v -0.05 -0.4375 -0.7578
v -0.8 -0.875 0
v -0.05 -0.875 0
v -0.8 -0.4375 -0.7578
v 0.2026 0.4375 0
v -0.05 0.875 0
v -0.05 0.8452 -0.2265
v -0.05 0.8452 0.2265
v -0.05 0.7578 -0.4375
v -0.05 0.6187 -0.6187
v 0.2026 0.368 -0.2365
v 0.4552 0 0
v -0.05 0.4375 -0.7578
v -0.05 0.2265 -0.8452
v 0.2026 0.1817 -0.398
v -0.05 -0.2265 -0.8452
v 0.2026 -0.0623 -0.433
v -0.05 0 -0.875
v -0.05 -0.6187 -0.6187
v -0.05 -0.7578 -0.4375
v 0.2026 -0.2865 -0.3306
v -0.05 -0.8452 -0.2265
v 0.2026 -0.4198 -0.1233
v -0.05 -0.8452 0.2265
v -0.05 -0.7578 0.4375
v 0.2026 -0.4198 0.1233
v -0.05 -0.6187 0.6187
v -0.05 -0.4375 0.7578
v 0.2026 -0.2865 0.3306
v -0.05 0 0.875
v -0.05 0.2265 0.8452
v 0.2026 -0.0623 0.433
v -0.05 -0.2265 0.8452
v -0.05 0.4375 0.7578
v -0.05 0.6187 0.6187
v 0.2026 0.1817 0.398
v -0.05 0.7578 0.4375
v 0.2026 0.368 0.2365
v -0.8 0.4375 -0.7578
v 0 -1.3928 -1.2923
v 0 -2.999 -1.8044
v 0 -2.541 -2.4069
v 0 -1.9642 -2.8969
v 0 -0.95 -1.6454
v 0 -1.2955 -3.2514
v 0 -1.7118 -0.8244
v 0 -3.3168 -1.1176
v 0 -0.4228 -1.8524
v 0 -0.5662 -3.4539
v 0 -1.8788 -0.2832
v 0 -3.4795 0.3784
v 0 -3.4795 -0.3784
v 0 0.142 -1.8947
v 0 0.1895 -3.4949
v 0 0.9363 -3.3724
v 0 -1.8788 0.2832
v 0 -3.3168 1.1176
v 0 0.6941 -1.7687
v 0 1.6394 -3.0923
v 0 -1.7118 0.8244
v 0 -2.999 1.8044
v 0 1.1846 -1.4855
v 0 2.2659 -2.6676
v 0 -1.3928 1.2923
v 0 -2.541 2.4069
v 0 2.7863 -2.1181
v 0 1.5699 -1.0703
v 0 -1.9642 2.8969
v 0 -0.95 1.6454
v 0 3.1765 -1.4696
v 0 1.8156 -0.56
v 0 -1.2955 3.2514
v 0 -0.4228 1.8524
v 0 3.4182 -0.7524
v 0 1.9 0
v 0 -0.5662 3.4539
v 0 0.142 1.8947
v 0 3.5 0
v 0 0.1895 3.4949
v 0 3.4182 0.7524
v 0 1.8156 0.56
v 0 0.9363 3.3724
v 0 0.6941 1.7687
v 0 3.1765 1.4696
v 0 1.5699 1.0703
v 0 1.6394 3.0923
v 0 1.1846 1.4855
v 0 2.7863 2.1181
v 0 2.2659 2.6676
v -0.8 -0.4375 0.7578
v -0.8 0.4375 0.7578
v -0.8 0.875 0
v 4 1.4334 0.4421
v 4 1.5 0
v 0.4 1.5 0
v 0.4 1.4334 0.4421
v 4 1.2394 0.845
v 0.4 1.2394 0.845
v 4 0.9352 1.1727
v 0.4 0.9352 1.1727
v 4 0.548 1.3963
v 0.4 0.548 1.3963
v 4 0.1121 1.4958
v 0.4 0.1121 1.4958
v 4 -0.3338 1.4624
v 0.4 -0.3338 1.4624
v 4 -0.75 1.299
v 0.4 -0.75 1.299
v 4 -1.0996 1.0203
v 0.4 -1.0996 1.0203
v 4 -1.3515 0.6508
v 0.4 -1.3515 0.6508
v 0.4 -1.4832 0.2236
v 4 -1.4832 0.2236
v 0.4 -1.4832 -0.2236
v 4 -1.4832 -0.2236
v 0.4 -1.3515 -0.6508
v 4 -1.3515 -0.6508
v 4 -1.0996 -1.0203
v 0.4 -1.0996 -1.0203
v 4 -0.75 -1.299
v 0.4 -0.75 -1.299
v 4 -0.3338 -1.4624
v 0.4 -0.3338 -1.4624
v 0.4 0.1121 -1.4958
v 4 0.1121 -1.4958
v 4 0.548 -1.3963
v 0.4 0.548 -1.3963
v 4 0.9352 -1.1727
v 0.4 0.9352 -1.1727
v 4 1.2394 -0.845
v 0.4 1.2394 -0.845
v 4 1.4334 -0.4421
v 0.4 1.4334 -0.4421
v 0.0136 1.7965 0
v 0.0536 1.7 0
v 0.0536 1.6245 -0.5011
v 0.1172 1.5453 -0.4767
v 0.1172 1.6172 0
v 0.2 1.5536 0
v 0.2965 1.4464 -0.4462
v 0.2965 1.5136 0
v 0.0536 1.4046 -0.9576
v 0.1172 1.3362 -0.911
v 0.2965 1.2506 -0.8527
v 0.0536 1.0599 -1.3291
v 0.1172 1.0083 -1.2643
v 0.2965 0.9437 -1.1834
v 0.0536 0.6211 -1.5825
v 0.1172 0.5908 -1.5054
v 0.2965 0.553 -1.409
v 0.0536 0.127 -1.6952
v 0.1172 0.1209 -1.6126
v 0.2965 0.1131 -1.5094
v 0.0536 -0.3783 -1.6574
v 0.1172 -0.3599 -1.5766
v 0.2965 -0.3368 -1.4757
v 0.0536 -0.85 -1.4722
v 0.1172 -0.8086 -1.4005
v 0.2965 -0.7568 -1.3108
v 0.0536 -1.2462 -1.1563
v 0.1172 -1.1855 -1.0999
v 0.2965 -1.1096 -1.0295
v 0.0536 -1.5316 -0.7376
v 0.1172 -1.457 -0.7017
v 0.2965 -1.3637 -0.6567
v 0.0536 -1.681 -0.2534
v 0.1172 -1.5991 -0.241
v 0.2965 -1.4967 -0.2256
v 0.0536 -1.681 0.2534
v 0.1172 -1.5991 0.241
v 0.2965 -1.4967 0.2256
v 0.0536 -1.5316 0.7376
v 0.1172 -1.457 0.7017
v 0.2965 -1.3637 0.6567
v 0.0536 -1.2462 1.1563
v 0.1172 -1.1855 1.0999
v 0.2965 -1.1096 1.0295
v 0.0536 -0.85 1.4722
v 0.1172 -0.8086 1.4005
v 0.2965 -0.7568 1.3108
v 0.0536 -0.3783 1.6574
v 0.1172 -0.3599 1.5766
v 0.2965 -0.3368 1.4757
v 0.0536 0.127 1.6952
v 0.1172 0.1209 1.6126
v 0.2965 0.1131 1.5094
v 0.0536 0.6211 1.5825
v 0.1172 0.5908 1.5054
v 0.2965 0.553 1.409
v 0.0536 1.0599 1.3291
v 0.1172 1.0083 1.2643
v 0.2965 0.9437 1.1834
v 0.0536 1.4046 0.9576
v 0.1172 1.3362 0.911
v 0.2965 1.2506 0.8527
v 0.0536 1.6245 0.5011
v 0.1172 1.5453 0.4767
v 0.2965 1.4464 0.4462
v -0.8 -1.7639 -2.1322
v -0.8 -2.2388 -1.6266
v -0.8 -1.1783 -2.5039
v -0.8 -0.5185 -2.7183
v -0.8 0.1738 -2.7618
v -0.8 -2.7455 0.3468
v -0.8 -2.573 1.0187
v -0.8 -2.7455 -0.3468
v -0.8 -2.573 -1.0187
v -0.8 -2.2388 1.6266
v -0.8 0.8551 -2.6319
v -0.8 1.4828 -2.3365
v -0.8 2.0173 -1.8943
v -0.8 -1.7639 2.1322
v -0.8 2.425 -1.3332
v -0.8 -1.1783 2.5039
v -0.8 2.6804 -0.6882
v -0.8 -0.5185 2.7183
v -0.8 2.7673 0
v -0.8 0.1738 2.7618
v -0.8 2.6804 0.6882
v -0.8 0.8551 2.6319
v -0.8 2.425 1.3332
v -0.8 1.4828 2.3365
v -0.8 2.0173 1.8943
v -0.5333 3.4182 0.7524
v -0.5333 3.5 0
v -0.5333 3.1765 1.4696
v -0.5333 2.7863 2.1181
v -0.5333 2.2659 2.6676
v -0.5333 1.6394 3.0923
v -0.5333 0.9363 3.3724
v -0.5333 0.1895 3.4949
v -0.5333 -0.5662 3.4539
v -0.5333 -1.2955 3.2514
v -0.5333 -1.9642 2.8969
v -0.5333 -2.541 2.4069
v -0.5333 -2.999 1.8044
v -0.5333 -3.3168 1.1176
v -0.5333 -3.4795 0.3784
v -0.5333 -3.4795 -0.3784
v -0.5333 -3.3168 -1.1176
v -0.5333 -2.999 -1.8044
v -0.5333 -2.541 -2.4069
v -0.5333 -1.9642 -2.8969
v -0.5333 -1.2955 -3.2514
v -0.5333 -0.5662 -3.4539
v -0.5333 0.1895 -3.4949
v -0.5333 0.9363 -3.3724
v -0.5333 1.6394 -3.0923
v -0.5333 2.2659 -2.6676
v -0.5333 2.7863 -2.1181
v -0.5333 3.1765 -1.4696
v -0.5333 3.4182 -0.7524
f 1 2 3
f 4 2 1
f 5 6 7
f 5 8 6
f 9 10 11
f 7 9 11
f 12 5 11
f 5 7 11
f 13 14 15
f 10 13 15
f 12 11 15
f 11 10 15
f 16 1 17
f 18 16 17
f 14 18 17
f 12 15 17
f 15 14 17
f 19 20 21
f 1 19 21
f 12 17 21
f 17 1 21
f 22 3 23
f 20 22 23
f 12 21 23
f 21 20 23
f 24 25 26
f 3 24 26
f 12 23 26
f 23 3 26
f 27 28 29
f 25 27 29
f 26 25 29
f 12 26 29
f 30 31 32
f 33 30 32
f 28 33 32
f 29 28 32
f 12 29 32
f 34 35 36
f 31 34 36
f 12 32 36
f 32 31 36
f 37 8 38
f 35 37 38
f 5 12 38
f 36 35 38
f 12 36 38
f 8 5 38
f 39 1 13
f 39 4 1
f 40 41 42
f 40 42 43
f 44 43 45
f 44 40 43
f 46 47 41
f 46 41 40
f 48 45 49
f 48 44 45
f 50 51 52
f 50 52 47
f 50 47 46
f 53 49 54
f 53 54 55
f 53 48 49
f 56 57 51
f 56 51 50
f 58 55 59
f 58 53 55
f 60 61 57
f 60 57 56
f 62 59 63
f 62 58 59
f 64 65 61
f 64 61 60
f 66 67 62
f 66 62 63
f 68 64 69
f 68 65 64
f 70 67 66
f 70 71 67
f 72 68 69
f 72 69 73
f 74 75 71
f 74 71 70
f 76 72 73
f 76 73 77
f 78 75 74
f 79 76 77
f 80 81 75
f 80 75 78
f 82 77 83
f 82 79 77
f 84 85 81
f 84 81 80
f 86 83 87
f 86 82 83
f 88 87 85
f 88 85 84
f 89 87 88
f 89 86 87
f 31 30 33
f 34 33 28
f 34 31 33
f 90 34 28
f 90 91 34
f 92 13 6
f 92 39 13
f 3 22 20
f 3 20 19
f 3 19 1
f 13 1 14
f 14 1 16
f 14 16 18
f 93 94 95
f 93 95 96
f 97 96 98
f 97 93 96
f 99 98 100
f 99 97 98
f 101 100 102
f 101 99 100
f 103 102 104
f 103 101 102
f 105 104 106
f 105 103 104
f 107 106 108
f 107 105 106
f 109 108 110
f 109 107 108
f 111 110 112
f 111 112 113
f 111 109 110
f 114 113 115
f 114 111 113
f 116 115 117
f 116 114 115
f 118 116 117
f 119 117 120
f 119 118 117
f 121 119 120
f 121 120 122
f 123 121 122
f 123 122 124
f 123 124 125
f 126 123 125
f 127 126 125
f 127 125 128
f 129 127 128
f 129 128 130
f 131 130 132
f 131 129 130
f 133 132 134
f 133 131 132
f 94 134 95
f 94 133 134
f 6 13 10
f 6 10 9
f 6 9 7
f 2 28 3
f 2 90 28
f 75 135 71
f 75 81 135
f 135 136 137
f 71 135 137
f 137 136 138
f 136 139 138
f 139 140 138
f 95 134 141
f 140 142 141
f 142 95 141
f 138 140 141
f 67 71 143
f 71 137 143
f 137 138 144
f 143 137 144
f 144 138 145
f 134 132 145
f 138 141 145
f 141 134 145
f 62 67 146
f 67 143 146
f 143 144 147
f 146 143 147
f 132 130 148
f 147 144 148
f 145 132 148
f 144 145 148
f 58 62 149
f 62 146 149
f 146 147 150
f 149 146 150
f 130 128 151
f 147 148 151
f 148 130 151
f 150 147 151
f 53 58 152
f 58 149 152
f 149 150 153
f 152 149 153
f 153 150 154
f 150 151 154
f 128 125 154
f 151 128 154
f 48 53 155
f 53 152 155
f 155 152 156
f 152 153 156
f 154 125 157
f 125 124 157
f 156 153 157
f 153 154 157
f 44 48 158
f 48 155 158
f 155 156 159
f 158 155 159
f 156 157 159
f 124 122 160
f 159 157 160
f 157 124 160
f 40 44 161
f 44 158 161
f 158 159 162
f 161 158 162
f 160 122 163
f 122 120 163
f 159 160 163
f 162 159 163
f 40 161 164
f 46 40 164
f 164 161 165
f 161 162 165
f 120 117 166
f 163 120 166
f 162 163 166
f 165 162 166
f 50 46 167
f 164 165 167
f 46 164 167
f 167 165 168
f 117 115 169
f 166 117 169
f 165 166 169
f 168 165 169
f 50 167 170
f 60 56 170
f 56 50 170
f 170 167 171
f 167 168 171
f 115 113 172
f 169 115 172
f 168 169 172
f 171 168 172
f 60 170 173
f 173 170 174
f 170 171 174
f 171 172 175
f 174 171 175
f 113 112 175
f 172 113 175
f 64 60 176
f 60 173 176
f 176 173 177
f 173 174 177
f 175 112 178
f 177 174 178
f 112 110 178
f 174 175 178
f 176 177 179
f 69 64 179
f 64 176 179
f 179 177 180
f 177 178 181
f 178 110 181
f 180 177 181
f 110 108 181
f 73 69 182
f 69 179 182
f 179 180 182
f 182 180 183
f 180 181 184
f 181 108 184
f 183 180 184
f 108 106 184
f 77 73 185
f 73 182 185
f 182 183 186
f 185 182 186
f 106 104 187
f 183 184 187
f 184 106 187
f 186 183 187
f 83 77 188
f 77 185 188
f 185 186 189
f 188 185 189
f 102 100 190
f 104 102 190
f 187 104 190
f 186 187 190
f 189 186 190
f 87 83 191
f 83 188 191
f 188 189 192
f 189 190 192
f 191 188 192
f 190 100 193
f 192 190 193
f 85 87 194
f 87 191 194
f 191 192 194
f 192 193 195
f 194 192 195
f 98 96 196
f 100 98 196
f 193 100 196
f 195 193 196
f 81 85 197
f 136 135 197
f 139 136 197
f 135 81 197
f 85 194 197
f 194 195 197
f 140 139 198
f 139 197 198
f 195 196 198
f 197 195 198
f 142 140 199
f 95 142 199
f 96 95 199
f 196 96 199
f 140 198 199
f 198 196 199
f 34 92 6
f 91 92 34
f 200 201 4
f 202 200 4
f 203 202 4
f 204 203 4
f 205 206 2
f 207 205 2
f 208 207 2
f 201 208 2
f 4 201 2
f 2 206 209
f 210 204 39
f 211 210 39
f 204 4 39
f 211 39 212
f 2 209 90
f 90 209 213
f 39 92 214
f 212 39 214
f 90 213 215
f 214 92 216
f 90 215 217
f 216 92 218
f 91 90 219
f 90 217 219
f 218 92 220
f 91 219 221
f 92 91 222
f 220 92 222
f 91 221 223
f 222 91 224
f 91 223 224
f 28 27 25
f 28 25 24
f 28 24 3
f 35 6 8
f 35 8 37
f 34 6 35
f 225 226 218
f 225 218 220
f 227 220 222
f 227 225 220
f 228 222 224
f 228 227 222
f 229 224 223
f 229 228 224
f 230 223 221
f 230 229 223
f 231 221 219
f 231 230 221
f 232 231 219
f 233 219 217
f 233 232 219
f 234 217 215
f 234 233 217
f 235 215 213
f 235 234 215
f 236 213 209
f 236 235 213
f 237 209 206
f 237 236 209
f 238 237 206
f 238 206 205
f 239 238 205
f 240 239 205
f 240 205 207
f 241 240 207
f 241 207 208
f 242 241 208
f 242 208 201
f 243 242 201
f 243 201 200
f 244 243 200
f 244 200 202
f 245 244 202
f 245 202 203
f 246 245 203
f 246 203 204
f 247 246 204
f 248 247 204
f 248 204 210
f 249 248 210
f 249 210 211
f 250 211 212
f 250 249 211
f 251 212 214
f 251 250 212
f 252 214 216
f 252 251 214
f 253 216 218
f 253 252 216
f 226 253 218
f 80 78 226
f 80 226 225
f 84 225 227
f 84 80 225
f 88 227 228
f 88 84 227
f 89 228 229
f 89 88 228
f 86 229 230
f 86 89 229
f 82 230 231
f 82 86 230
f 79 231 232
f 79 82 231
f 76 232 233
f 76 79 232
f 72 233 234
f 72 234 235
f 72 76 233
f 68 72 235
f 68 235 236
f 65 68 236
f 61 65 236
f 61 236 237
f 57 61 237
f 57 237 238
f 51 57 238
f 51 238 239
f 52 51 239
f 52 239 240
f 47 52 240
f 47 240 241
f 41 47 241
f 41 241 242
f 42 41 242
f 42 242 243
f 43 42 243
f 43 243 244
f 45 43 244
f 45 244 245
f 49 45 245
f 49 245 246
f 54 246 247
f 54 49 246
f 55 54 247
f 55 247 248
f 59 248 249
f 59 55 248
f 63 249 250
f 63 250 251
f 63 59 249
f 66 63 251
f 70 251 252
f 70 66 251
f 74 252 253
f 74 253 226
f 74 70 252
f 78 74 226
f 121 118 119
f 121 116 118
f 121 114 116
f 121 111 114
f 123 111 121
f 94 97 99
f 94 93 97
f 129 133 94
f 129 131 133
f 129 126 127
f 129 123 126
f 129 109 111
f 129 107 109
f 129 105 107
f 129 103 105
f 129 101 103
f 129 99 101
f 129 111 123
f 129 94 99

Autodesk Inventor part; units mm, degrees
ref_plane "YZ Plane" through (0, 0, 0) normal (1, 0, 0) x (0, 1, 0)
ref_plane "XZ Plane" through (0, 0, 0) normal (0, 1, 0) x (-1, 0, 0)
ref_plane "XY Plane" through (0, 0, 0) normal (0, 0, 1) x (1, 0, 0)
sketch "Sketch_1" plane through (0, 0, 0) normal (0, 0, 1) x (1, 0, 0)
  line L0 (6, 0) -> (0, 0)
  line L1 (-0.8, 0) -> (-0.8, 2.7673)
  line L2 (-0.8, 2.7673) -> (-0.5333, 3.5)
  line L3 (-0.5333, 3.5) -> (0, 3.5)
  line L4 (0, 3.5) -> (0, 1.9)
  arc A0 (0, 1.9) -> (0.4, 1.5) centre (0.4, 1.9) ccw
  line L5 (0.4, 1.5) -> (6, 1.5)
  line L6 (6, 1.5) -> (6, 0)
  line L7 (6, 0) -> (-0.8, 0)
  line L8 (0, 0) -> (-0.8, 0)
  dimension "d6" = 6
revolve "Revolution1" add sketch "Sketch_1" angle 360 about axis through (6, 0, 0) along (1, 0, 0)
thread "Thread1" size "M3x0.5" class "6g" standard "ISO Metric profile" length 5.5 offset 0.1
sketch "Sketch_5" plane through (-0.05, 0, 0) normal (1, 0, 0) x (0, 0, -1)
  arc A0 (-0.6801, -0.1159) -> (-0.4404, -0.531) centre (-0.5499, -0.3175) ccw
  arc A1 (-0.341, -0.5357) -> (-0.4404, -0.531) centre (-0.3947, -0.62) ccw
  arc A2 (-0.341, -0.5357) -> (-0.2934, -0.5632) centre (0, 0) ccw
  arc A3 (-0.2397, -0.6469) -> (-0.2934, -0.5632) centre (-0.3396, -0.6519) ccw
  arc A4 (-0.2397, -0.6469) -> (0.2397, -0.6469) centre (0, -0.635) ccw
  arc A5 (0.2934, -0.5632) -> (0.2397, -0.6469) centre (0.3396, -0.6519) ccw
  arc A6 (0.2934, -0.5632) -> (0.341, -0.5357) centre (0, 0) ccw
  arc A7 (0.4404, -0.531) -> (0.341, -0.5357) centre (0.3947, -0.62) ccw
  arc A8 (0.4404, -0.531) -> (0.6801, -0.1159) centre (0.5499, -0.3175) ccw
  arc A9 (0.6344, -0.0275) -> (0.6801, -0.1159) centre (0.7343, -0.0318) ccw
  arc A10 (0.6344, -0.0275) -> (0.6344, 0.0275) centre (0, 0) ccw
  arc A11 (0.6801, 0.1159) -> (0.6344, 0.0275) centre (0.7343, 0.0318) ccw
  arc A12 (0.6801, 0.1159) -> (0.4404, 0.531) centre (0.5499, 0.3175) ccw
  arc A13 (0.341, 0.5357) -> (0.4404, 0.531) centre (0.3947, 0.62) ccw
  arc A14 (0.341, 0.5357) -> (0.2934, 0.5632) centre (0, 0) ccw
  arc A15 (0.2397, 0.6469) -> (0.2934, 0.5632) centre (0.3396, 0.6519) ccw
  arc A16 (0.2397, 0.6469) -> (-0.2397, 0.6469) centre (0, 0.635) ccw
  arc A17 (-0.2934, 0.5632) -> (-0.2397, 0.6469) centre (-0.3396, 0.6519) ccw
  arc A18 (-0.2934, 0.5632) -> (-0.341, 0.5357) centre (0, 0) ccw
  arc A19 (-0.4404, 0.531) -> (-0.341, 0.5357) centre (-0.3947, 0.62) ccw
  arc A20 (-0.4404, 0.531) -> (-0.6801, 0.1159) centre (-0.5499, 0.3175) ccw
  arc A21 (-0.6344, 0.0275) -> (-0.6801, 0.1159) centre (-0.7343, 0.0318) ccw
  arc A22 (-0.6344, 0.0275) -> (-0.6344, -0.0275) centre (0, 0) ccw
  arc A23 (-0.6801, -0.1159) -> (-0.6344, -0.0275) centre (-0.7343, -0.0318) ccw
extrude "Extrusion1" cut sketch "Sketch_5" against normal blind 0.75
sketch "Sketch_2" plane through (0, 0, 0) normal (0, 0, 1) x (1, 0, 0)
  line L0 (0.4552, 0) -> (0, 0)
  line L1 (-0.05, 0) -> (-0.05, 0.875)
  line L2 (-0.05, 0.875) -> (0.4552, 0)
  line L3 (0.4552, 0) -> (-0.05, 0)
revolve "Revolution2" cut sketch "Sketch_2" angle 360 about axis through (0.4552, 0, 0) along (1, 0, 0)
sketch "スケッチ4" plane through (6, 0, 0) normal (1, 0, 0) x (0, 0, -1)
  circle A0 centre (0, 0) radius 1.5 projected
extrude "押し出し2" cut sketch "スケッチ4" against normal blind 2
sketch "スケッチ5" plane through (-0.8, 0, 0) normal (-1, 0, 0) x (0, 0, 1)
  arc A0 (0.4404, -0.531) -> (0.341, -0.5357) centre (0.3947, -0.62) ccw projected
  arc A1 (0.2934, -0.5632) -> (0.341, -0.5357) centre (0, 0) ccw projected
  arc A2 (0.2934, -0.5632) -> (0.2397, -0.6469) centre (0.3396, -0.6519) ccw projected
  arc A3 (-0.2397, -0.6469) -> (0.2397, -0.6469) centre (0, -0.635) ccw projected
  arc A4 (-0.2397, -0.6469) -> (-0.2934, -0.5632) centre (-0.3396, -0.6519) ccw projected
  arc A5 (-0.341, -0.5357) -> (-0.2934, -0.5632) centre (0, 0) ccw projected
  arc A6 (-0.341, -0.5357) -> (-0.4404, -0.531) centre (-0.3947, -0.62) ccw projected
  arc A7 (-0.6801, -0.1159) -> (-0.4404, -0.531) centre (-0.5499, -0.3175) ccw projected
  arc A8 (-0.6801, -0.1159) -> (-0.6344, -0.0275) centre (-0.7343, -0.0318) ccw projected
  arc A9 (-0.6344, 0.0275) -> (-0.6344, -0.0275) centre (0, 0) ccw projected
  arc A10 (-0.6344, 0.0275) -> (-0.6801, 0.1159) centre (-0.7343, 0.0318) ccw projected
  arc A11 (-0.4404, 0.531) -> (-0.6801, 0.1159) centre (-0.5499, 0.3175) ccw projected
  arc A12 (-0.4404, 0.531) -> (-0.341, 0.5357) centre (-0.3947, 0.62) ccw projected
  arc A13 (-0.2934, 0.5632) -> (-0.341, 0.5357) centre (0, 0) ccw projected
  arc A14 (-0.2934, 0.5632) -> (-0.2397, 0.6469) centre (-0.3396, 0.6519) ccw projected
  arc A15 (0.2397, 0.6469) -> (-0.2397, 0.6469) centre (0, 0.635) ccw projected
  arc A16 (0.2397, 0.6469) -> (0.2934, 0.5632) centre (0.3396, 0.6519) ccw projected
  arc A17 (0.341, 0.5357) -> (0.2934, 0.5632) centre (0, 0) ccw projected
  arc A18 (0.341, 0.5357) -> (0.4404, 0.531) centre (0.3947, 0.62) ccw projected
  arc A19 (0.6801, 0.1159) -> (0.4404, 0.531) centre (0.5499, 0.3175) ccw projected
  arc A20 (0.6801, 0.1159) -> (0.6344, 0.0275) centre (0.7343, 0.0318) ccw projected
  arc A21 (0.6344, -0.0275) -> (0.6344, 0.0275) centre (0, 0) ccw projected
  arc A22 (0.6344, -0.0275) -> (0.6801, -0.1159) centre (0.7343, -0.0318) ccw projected
  arc A23 (0.4404, -0.531) -> (0.6801, -0.1159) centre (0.5499, -0.3175) ccw projected
  circle A24 centre (0, 0) radius 2.7673 projected
  arc A25 (-0.6801, -0.1159) -> (-0.7578, -0.4375) centre (-0.5499, -0.3175) ccw projected
  line L0 (-0.7578, -0.4375) -> (-0.7578, 0.4375)
  line L1 (-0.7578, 0.4375) -> (0, 0.875)
  line L2 (0, 0.875) -> (0.7578, 0.4375)
  line L3 (0.7578, 0.4375) -> (0.7578, -0.4375)
  line L4 (0.7578, -0.4375) -> (0, -0.875)
  line L5 (0, -0.875) -> (-0.7578, -0.4375)
  point P0 (-0.5499, -0.5575)
  point P1 (-0.2078, -0.755)
  point P2 (-0.7578, 0.1975)
  point P3 (-0.7578, -0.1975)
  point P4 (-0.2078, 0.755)
  point P5 (-0.5499, 0.5575)
  point P6 (0.5499, 0.5575)
  point P7 (0.2078, 0.755)
  point P8 (0.7578, -0.1975)
  point P9 (0.7578, 0.1975)
  point P10 (0.2078, -0.755)
  point P11 (0.5499, -0.5575)
  point P12 (-0.7578, 0.4375)
  point P13 (-0.7578, 0.4375)
  point P14 (0, 0.875)
  point P15 (0, 0.875)
  point P16 (0, -0.875)
  point P17 (0, -0.875)
extrude "押し出し3" cut sketch "スケッチ5" against normal up to surface (0.75 mm away) contours A23 L4 A3 A2 A1 A0 | A23 A22 A21 A20 A19 L3 | L5 A7 A6 A5 A4 A3 | A19 A18 A17 A16 A15 L2 | L0 A11 A10 A9 A8 A7 | A15 A14 A13 A12 A11 L1
extrude "押し出し4" add sketch "スケッチ5" against normal up to surface (0.75 mm away) contours L4 A23 | L3 A23 | A3 L4 | A3 L5 | L3 A19 | L2 A19 | A7 L5 | A7 L0 | L2 A15 | L1 A15 | A11 L0 | A11 L1
properties part number "超極低頭ネジL4M3" material "ステンレス鋼"
